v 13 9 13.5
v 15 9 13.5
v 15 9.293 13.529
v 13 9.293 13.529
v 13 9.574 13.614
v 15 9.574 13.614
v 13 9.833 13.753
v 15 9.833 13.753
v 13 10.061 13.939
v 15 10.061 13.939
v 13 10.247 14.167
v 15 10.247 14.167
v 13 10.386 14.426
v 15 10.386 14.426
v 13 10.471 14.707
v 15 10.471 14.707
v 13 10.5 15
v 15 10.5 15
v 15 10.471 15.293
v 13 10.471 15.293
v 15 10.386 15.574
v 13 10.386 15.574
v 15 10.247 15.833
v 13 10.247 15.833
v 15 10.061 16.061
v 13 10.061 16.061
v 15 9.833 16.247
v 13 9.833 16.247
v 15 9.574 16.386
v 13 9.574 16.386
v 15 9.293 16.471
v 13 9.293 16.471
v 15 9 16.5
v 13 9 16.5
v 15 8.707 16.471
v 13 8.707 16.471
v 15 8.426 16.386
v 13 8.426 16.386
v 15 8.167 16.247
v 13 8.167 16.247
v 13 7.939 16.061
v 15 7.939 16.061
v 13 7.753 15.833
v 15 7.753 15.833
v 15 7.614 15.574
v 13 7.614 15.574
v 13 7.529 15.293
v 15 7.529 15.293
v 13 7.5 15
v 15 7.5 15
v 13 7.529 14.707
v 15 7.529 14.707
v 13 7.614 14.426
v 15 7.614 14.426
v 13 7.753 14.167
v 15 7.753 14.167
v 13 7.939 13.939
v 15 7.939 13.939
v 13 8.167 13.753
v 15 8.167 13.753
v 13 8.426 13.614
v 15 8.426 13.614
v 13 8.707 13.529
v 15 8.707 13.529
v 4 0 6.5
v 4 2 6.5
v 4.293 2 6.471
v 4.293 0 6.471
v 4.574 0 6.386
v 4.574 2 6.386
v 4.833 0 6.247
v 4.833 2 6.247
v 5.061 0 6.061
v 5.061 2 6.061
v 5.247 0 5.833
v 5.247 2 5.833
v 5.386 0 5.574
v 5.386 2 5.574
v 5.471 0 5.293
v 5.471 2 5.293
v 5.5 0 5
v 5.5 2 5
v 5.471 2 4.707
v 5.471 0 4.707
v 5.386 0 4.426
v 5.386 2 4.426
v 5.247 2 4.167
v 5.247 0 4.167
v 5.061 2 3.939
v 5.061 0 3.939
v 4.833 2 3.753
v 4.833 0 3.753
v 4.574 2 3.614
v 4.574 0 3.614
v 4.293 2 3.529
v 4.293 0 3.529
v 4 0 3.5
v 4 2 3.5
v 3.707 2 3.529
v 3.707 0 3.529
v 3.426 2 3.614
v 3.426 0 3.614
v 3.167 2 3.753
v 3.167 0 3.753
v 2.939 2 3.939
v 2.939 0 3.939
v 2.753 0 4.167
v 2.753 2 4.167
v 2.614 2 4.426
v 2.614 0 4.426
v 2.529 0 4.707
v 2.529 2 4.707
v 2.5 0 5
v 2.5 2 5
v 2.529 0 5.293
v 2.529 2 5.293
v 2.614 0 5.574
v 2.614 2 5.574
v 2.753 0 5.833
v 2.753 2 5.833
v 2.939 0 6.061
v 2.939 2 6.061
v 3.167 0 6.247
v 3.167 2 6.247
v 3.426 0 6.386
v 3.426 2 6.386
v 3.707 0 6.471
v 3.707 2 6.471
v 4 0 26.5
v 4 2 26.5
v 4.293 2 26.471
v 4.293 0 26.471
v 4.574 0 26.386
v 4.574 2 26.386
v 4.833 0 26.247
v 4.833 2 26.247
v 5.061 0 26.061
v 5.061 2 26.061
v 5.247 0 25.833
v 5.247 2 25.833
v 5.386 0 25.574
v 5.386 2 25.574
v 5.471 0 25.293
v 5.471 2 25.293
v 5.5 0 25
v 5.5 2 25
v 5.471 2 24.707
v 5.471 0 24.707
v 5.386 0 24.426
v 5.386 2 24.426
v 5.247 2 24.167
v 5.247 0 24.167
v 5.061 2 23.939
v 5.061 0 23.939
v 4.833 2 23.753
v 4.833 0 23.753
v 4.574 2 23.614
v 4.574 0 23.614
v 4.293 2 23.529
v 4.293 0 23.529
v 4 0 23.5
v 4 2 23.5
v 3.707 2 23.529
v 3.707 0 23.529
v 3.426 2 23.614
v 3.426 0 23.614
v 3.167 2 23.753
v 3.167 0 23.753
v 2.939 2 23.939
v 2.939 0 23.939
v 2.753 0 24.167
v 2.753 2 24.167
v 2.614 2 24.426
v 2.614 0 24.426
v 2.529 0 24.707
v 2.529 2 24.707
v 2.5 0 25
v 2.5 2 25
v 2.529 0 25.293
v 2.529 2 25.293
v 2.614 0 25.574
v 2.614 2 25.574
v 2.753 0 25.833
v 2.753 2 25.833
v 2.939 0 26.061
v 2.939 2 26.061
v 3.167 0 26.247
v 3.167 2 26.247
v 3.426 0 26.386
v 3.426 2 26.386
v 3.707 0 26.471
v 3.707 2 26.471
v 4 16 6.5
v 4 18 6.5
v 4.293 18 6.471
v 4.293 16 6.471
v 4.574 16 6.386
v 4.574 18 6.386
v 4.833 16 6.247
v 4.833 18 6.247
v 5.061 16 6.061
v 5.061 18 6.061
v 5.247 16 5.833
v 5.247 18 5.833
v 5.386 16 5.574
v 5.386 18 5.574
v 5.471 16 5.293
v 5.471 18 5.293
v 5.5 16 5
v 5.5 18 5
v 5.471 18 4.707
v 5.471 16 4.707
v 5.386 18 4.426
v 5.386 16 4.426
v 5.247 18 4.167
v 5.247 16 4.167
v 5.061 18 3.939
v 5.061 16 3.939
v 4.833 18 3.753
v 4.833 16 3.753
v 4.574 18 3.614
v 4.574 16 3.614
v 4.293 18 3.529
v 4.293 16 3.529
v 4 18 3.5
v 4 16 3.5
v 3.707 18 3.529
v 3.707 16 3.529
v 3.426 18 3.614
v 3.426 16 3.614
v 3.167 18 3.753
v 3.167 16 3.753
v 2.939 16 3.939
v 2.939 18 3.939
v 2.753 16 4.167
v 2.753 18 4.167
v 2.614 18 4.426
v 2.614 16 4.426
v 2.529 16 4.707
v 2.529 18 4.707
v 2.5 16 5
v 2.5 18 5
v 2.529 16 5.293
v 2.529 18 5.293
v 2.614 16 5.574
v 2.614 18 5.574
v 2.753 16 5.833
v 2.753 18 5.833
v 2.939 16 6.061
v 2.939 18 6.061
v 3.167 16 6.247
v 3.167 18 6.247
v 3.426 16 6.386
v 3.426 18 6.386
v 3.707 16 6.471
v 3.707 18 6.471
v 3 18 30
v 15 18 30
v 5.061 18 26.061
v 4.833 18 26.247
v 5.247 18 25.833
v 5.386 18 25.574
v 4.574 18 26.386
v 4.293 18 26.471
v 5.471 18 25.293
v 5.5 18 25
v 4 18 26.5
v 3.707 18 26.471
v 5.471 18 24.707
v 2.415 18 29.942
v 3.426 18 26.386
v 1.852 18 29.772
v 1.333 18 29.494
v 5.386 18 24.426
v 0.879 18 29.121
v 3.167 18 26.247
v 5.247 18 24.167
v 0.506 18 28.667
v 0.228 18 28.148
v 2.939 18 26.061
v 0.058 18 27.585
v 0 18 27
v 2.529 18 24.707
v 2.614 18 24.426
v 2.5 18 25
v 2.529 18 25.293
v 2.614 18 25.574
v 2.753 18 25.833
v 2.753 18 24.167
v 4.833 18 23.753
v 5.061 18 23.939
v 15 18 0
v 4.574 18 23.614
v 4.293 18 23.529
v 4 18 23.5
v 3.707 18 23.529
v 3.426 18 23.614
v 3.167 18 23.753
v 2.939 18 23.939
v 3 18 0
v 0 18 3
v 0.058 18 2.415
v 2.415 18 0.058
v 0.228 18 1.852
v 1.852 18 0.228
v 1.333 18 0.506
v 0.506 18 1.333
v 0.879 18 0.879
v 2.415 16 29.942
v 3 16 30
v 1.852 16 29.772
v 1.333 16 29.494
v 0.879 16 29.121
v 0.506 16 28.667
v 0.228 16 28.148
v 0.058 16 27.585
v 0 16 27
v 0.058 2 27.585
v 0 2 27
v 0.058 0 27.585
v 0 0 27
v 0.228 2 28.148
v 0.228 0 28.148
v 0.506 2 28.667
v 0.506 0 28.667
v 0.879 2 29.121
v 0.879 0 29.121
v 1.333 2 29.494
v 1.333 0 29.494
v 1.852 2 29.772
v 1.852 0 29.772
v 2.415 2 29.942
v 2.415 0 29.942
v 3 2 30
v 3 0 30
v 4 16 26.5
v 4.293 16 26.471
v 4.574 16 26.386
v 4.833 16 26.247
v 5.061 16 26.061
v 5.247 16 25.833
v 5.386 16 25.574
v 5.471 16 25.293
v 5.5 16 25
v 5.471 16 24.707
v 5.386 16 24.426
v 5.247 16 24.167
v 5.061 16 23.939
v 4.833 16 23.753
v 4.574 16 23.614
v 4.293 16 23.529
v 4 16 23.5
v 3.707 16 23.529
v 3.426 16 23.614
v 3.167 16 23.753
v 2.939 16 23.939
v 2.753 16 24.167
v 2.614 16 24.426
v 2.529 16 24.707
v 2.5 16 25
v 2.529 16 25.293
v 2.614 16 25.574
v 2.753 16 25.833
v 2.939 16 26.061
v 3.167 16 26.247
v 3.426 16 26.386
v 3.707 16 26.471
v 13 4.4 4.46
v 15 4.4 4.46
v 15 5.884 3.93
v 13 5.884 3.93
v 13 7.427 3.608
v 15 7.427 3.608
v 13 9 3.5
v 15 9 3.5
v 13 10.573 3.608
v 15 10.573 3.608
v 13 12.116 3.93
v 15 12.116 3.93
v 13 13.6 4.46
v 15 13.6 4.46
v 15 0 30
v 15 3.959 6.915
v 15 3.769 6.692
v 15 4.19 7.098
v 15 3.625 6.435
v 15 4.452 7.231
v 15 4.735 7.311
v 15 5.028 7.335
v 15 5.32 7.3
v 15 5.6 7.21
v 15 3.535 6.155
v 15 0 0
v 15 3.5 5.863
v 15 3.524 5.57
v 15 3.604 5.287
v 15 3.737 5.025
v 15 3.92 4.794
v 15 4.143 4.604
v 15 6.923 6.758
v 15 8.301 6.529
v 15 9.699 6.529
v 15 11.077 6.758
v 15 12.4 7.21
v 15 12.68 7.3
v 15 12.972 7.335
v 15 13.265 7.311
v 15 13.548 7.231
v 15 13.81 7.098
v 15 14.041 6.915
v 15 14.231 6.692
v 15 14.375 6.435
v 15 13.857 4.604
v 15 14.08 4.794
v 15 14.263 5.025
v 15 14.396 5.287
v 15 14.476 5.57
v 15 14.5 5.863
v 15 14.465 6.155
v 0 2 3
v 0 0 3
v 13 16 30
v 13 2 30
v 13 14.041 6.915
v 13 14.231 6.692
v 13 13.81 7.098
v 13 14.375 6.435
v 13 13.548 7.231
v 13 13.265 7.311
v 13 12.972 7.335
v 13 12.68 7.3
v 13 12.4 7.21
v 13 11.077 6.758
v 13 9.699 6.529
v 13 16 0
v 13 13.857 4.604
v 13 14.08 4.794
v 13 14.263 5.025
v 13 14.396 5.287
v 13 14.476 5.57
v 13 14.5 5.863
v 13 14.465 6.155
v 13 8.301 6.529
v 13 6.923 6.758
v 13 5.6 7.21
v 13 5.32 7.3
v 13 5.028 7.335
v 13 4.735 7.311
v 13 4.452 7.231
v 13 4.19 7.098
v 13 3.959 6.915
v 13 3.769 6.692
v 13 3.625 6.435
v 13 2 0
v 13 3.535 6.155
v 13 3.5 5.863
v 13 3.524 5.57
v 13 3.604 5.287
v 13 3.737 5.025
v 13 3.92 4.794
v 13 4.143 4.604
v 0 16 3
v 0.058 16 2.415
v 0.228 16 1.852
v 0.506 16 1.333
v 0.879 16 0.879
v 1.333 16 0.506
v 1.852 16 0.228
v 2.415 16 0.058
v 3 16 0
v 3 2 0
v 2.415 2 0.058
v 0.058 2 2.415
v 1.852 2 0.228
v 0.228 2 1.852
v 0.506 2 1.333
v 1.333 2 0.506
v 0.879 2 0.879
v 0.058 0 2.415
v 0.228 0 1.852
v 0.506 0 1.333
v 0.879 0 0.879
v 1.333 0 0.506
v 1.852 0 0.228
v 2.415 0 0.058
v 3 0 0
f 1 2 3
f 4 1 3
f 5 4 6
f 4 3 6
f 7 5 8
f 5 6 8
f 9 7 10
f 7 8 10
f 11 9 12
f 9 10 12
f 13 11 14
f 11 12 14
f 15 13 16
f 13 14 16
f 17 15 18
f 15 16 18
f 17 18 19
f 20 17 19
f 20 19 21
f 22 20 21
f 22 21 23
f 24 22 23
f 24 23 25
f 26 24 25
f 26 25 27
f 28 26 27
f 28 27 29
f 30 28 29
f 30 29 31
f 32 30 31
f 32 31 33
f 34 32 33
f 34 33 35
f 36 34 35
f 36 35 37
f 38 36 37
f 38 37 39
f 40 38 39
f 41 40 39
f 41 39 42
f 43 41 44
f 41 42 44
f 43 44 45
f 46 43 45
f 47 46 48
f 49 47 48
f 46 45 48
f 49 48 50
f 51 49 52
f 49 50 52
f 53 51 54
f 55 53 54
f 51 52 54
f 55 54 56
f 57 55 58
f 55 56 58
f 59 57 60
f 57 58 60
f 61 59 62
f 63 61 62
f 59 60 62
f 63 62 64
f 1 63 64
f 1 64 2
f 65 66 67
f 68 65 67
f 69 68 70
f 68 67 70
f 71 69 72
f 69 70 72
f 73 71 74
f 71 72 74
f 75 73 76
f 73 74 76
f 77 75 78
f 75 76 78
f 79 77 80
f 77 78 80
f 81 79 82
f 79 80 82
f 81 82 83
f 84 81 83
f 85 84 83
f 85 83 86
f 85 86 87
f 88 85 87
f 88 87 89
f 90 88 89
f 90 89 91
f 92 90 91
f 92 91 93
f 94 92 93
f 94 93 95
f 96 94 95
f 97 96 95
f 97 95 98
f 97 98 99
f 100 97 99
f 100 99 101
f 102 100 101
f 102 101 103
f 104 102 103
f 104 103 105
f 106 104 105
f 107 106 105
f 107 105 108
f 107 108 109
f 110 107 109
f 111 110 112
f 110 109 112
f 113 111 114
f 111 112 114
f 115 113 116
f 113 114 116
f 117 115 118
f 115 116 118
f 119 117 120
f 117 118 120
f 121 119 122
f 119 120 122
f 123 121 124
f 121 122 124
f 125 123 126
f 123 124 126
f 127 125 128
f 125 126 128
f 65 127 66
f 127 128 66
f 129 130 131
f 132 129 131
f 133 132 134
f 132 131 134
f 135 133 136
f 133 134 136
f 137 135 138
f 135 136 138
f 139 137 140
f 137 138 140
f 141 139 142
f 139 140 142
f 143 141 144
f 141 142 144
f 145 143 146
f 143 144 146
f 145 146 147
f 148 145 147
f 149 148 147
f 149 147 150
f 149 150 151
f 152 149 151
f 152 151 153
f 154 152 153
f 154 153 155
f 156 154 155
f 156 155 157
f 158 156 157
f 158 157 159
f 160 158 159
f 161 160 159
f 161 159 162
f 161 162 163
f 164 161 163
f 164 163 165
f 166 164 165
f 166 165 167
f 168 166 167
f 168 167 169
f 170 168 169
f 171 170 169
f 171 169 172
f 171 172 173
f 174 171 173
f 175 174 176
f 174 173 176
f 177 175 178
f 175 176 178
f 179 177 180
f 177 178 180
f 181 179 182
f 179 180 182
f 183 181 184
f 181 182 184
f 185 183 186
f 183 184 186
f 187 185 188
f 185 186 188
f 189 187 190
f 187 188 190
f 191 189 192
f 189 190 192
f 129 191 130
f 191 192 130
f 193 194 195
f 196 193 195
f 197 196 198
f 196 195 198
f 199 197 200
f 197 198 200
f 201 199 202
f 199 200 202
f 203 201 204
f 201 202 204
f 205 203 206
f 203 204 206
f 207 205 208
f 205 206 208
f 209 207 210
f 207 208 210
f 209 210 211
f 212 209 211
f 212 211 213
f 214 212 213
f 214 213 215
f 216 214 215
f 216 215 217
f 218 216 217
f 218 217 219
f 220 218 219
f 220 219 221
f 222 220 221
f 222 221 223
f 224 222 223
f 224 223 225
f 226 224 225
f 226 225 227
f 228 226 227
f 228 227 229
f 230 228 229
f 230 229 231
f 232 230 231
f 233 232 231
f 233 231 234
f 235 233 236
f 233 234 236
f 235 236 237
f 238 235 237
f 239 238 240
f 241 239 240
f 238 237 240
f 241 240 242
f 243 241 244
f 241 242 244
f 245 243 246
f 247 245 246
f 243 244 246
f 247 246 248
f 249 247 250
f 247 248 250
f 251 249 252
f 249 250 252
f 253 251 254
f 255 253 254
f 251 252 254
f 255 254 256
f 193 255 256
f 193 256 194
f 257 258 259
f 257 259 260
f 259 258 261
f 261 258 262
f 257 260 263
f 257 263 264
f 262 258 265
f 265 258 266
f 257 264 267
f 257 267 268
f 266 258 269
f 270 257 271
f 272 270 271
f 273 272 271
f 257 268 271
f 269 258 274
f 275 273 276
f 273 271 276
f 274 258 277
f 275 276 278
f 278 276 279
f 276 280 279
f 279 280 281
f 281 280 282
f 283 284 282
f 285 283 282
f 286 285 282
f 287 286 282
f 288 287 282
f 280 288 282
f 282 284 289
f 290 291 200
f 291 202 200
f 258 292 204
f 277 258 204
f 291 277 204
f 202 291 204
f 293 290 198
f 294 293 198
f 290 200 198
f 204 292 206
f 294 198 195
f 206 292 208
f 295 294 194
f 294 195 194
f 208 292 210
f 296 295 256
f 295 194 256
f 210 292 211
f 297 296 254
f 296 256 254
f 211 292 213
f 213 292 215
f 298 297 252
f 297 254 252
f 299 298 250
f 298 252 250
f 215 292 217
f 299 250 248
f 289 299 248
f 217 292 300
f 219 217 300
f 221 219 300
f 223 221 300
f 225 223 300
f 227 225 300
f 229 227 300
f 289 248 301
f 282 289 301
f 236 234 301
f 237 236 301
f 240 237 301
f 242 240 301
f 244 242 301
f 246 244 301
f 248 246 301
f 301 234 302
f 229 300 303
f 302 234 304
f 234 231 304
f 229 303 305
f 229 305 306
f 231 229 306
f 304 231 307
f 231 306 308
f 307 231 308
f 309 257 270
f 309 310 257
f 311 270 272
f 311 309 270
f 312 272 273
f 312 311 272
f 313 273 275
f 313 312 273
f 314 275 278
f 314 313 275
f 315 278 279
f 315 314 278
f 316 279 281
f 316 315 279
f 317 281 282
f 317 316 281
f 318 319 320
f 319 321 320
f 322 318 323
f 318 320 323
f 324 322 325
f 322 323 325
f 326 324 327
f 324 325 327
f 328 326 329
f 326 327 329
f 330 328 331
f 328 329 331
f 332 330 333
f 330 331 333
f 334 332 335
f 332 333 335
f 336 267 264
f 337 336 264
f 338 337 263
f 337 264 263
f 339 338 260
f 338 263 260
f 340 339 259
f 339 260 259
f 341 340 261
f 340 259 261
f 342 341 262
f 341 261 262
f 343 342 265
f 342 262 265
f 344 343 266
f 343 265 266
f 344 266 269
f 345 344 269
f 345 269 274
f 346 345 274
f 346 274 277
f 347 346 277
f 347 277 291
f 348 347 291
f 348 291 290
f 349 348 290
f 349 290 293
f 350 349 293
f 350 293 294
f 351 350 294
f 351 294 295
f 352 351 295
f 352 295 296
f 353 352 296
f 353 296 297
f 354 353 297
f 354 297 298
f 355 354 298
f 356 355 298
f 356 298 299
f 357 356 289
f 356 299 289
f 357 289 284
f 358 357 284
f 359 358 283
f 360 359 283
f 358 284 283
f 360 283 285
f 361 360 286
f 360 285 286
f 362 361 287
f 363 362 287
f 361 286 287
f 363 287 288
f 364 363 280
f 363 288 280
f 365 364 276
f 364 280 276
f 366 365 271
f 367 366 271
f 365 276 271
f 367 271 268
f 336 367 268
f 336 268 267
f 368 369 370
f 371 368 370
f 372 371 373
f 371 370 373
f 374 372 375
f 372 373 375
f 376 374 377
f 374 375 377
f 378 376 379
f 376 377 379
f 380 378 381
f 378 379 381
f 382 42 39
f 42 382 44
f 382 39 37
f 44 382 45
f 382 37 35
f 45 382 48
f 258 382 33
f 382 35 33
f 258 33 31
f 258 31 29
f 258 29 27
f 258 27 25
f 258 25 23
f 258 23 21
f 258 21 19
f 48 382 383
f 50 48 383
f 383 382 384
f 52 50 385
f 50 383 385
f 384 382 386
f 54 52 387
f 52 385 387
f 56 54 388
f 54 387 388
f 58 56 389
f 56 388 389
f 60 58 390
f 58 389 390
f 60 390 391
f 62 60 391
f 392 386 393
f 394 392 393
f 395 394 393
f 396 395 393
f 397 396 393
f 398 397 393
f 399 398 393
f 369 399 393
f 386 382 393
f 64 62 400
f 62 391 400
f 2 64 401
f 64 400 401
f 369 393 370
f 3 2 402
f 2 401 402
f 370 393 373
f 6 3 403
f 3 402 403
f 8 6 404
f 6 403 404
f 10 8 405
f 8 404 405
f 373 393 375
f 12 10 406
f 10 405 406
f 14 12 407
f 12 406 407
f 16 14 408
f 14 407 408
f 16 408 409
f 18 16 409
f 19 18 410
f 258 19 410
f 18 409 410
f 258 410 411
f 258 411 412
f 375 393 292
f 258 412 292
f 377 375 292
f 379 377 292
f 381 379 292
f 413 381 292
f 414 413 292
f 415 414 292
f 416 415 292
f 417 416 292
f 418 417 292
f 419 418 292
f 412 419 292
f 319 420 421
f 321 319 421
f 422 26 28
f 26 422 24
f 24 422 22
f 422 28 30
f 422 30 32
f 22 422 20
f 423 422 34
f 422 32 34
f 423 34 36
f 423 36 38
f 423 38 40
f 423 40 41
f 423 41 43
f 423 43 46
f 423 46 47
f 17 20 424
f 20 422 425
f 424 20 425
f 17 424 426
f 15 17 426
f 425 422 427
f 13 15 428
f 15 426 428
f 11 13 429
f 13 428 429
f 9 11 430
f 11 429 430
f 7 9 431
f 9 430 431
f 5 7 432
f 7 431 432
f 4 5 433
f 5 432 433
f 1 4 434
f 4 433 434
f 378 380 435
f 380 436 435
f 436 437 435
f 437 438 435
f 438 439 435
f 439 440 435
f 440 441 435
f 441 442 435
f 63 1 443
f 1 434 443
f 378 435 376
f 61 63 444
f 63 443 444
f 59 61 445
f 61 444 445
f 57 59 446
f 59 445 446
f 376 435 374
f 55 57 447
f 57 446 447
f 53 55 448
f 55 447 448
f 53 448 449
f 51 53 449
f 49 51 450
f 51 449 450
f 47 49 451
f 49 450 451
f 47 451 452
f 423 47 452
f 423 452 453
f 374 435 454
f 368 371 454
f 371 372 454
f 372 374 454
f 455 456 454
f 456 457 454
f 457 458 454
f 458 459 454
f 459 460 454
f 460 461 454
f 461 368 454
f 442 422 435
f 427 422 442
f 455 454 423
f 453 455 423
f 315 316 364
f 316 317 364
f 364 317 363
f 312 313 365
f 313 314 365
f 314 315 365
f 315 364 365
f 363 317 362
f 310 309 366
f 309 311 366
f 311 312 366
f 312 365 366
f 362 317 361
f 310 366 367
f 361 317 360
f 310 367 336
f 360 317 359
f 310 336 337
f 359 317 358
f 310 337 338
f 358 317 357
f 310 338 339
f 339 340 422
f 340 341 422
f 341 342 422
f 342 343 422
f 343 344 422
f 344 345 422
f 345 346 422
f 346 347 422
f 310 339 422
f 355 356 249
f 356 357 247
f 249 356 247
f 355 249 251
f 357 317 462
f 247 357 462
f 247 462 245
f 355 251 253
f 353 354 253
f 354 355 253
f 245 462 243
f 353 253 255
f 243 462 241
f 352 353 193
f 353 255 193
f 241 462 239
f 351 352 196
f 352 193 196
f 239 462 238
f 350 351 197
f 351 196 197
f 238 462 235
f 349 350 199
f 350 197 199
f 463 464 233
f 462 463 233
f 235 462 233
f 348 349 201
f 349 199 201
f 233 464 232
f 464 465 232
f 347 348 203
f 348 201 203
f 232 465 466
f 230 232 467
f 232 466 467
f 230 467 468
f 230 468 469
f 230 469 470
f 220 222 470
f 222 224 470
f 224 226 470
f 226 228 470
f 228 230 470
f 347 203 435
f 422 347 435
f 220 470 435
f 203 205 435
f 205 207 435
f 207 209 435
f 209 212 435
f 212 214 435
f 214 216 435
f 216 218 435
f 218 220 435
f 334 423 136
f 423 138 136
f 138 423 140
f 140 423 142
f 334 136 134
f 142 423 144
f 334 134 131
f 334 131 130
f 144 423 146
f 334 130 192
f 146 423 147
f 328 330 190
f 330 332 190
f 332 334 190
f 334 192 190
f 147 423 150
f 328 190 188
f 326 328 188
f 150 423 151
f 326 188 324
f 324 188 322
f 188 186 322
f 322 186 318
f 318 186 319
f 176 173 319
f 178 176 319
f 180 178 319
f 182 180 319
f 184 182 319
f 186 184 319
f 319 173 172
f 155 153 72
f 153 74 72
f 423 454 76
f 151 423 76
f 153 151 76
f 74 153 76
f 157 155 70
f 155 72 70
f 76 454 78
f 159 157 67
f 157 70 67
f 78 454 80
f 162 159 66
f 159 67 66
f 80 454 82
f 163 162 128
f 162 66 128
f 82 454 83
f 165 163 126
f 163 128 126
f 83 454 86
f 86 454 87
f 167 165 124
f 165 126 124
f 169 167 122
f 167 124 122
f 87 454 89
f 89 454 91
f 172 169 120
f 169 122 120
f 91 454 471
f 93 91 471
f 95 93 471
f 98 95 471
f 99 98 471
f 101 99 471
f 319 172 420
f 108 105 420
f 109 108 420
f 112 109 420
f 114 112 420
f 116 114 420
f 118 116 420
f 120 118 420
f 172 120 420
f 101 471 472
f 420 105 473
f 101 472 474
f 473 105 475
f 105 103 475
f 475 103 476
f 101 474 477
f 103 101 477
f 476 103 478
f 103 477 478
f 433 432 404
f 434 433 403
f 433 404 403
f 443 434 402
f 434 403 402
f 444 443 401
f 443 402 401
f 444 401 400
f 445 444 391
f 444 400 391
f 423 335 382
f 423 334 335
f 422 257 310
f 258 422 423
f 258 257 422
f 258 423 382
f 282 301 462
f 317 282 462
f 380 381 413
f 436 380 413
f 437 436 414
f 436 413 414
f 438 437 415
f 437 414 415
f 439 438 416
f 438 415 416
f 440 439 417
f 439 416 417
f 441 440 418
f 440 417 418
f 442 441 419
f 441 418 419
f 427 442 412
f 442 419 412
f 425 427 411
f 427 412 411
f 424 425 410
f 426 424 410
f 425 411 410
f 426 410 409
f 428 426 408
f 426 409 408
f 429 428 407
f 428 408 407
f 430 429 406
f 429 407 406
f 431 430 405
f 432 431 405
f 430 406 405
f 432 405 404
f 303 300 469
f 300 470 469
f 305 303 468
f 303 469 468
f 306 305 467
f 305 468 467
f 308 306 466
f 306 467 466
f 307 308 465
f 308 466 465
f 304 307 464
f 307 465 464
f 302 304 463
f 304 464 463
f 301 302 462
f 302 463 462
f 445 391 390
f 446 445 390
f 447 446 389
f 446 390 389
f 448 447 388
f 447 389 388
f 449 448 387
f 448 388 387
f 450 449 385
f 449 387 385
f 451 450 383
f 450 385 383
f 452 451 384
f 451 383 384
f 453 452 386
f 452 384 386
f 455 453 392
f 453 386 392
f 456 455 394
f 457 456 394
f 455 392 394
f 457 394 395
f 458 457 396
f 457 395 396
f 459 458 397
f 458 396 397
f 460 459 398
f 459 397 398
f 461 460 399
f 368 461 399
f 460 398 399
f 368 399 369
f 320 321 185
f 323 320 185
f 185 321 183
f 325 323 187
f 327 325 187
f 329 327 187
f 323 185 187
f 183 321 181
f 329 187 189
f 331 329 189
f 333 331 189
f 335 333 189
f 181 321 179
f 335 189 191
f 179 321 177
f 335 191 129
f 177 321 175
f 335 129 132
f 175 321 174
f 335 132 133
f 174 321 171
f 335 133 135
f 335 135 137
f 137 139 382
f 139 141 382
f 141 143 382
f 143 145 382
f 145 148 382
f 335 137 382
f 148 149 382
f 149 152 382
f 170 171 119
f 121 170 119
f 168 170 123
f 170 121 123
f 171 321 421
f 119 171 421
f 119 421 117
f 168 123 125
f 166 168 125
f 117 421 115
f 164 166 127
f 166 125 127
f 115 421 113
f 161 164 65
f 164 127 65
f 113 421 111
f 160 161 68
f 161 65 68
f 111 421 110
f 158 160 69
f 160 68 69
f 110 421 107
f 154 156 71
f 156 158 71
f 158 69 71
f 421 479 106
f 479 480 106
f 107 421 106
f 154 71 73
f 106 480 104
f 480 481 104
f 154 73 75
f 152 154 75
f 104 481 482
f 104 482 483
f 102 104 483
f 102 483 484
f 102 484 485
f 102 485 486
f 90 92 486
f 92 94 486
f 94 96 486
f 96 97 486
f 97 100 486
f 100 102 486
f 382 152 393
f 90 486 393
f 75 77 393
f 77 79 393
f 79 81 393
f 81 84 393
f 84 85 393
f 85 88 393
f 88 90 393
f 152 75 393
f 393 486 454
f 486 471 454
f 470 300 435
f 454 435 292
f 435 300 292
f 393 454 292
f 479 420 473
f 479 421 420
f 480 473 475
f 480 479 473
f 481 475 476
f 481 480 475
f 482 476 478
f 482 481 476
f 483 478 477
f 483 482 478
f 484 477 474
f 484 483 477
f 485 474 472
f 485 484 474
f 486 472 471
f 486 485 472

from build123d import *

# Parameters (mm, degrees)
BOSS_EXTRUDE1_DEPTH = 30
SKETCH2_R           = 1.5
CUT_EXTRUDE1_DEPTH  = 39.065732621
FILLET1_R           = 3
SKETCH3_R           = 1.5
CUT_EXTRUDE2_DEPTH  = 30


with BuildPart() as part:
    # Sketch1 → Boss-Extrude1 (new body)
    with BuildSketch(Plane.XY):
        Polygon((0, 0), (15, 0), (15, 18), (0, 18), (0, 16), (13, 16), (13, 2), (0, 2), align=None)
    extrude(amount=BOSS_EXTRUDE1_DEPTH)

    # Sketch2 → Cut-Extrude1 (cut, through all)
    with BuildSketch(Plane(origin=(0, 18, 0), x_dir=(1, 0, 0), z_dir=(0, 1, 0))):
        with Locations(Location((4, -5, 0), (0, 0, 270))):
            Circle(SKETCH2_R)
        with Locations(Location((4, -25, 0), (0, 0, 270))):
            Circle(SKETCH2_R)
    extrude(amount=-CUT_EXTRUDE1_DEPTH, mode=Mode.SUBTRACT)

    # Fillet1
    fillet1_edges = [part.edges().sort_by_distance(p)[0] for p in [
        (0, 1, 0),
        (0, 17, 30),
        (0, 1, 30),
        (0, 17, 0),
    ]]
    fillet(fillet1_edges, radius=FILLET1_R)

    # Sketch3 → Cut-Extrude2 (cut)
    with BuildSketch(Plane(origin=(15, 0, 0), x_dir=(0, 0, -1), z_dir=(1, 0, 0))):
        with Locations((-15, 9)):
            Circle(SKETCH3_R)
        with BuildLine():
            ThreePointArc((-4.460075902, 4.4), (-3.5, 9), (-4.460075902, 13.6))
            ThreePointArc((-4.460075902, 13.6), (-6.43484861, 14.374772708), (-7.209621319, 12.4))
            ThreePointArc((-7.209621319, 12.4), (-6.5, 9), (-7.209621319, 5.6))
            ThreePointArc((-7.209621319, 5.6), (-6.43484861, 3.625227292), (-4.460075902, 4.4))
        make_face()
    extrude(amount=-CUT_EXTRUDE2_DEPTH, mode=Mode.SUBTRACT)


solid = part.part
